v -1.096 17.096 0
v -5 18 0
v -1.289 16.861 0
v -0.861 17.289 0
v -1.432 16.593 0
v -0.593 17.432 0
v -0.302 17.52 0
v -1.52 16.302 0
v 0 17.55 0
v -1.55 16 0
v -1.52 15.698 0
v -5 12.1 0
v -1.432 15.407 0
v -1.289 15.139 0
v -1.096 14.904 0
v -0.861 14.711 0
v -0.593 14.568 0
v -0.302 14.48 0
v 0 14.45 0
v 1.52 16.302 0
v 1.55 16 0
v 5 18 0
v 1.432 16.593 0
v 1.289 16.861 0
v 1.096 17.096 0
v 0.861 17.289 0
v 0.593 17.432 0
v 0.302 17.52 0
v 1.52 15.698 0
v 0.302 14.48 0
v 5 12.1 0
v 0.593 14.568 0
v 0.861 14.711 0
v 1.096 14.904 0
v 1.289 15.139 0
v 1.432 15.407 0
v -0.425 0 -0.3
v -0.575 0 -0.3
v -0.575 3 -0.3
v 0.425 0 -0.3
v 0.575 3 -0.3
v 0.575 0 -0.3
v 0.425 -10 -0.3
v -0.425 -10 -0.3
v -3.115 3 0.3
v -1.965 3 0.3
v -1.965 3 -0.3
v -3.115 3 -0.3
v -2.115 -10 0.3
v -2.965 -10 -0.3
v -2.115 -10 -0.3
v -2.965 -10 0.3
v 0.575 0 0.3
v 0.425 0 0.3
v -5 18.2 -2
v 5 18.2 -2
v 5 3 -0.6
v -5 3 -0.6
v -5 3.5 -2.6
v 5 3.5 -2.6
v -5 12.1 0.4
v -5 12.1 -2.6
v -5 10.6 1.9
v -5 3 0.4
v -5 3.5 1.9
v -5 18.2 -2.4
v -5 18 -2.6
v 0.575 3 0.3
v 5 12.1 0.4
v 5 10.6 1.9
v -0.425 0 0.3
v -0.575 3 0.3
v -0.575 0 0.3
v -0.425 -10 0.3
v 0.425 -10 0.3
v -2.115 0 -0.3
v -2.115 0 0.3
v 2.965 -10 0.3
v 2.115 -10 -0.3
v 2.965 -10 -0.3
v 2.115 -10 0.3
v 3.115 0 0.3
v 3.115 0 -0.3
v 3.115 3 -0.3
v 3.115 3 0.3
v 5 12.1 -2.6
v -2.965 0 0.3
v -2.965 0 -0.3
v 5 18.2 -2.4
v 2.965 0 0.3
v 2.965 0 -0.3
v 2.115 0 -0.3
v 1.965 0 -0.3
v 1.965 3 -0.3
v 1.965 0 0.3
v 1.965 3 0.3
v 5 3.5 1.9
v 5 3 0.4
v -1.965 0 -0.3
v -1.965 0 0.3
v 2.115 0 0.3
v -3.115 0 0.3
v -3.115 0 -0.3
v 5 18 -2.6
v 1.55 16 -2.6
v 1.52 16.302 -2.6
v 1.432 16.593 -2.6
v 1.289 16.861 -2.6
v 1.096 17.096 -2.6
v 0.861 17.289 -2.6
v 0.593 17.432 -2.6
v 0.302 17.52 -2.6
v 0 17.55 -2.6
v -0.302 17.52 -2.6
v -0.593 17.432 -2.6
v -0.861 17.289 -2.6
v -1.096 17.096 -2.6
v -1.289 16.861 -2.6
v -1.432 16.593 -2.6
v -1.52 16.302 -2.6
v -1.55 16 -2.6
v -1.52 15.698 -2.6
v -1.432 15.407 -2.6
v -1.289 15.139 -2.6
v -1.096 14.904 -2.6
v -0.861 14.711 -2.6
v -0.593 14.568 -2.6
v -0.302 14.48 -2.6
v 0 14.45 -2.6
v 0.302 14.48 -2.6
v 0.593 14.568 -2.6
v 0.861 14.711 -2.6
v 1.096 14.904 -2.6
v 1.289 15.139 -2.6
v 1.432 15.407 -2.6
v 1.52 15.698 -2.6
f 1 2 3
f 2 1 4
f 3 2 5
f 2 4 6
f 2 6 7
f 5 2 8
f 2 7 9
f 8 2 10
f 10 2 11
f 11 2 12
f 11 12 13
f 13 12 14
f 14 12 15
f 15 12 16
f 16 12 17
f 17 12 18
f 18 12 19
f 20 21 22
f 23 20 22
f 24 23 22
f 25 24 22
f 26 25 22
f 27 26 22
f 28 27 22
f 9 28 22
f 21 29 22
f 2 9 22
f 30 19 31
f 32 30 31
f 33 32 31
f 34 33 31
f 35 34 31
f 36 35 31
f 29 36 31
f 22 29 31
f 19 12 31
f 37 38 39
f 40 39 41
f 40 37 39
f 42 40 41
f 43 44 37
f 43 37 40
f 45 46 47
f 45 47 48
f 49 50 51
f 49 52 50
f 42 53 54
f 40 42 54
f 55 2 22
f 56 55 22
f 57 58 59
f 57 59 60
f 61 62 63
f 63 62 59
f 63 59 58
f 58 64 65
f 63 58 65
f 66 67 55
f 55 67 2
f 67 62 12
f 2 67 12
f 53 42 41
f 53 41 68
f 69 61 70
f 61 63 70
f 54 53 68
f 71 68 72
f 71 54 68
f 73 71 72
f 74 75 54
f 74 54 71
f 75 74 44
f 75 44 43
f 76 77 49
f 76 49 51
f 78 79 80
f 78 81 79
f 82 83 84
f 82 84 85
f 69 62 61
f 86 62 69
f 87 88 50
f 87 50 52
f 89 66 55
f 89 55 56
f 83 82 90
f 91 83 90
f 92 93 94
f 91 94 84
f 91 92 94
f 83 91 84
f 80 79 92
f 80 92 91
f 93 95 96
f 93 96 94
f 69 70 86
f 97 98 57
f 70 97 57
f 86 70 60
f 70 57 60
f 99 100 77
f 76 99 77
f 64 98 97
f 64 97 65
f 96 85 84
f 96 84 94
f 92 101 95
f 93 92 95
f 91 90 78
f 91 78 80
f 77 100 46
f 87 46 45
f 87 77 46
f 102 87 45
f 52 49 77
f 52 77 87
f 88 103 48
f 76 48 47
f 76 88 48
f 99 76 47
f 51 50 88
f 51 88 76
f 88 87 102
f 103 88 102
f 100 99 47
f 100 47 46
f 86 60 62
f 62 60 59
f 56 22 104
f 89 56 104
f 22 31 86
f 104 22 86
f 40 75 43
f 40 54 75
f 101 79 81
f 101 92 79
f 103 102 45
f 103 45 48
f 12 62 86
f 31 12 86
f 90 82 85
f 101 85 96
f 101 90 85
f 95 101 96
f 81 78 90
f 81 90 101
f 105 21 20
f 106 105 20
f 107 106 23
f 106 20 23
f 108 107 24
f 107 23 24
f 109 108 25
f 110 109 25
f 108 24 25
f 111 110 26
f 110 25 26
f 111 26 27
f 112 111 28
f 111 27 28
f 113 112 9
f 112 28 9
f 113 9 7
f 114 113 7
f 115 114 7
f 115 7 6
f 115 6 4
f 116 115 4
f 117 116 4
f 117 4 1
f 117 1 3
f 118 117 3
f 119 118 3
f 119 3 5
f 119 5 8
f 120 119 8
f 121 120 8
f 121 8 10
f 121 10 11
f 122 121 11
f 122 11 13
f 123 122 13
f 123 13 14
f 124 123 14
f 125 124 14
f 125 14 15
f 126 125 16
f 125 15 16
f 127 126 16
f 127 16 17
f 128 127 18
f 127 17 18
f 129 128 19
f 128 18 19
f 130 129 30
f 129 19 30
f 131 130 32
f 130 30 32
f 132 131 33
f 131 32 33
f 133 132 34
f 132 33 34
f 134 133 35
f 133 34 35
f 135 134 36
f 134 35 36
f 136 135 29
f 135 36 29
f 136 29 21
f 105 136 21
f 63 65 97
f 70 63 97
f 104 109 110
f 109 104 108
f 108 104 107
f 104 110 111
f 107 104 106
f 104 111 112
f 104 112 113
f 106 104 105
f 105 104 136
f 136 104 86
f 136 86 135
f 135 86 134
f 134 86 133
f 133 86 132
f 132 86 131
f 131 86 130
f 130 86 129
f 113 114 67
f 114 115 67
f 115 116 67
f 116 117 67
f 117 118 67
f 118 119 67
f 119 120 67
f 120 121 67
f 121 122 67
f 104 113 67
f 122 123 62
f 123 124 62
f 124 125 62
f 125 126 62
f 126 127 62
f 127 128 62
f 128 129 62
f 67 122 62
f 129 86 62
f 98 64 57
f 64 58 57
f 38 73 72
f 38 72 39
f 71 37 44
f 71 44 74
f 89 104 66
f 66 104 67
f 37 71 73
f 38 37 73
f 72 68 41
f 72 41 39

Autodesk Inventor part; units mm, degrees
ref_plane "YZ Plane" through (0, 0, 0) normal (1, 0, 0) x (0, 1, 0)
ref_plane "XZ Plane" through (0, 0, 0) normal (0, 1, 0) x (-1, 0, 0)
ref_plane "XY Plane" through (0, 0, 0) normal (0, 0, 1) x (1, 0, 0)
sketch "Sketch1" plane through (0, 0, 0) normal (0, 1, 0) x (-1, 0, 0)
  line L0 (3.115, -0.3) -> (1.965, -0.3)
  line L1 (1.965, -0.3) -> (1.965, 0.3)
  line L2 (1.965, 0.3) -> (3.115, 0.3)
  line L3 (3.115, 0.3) -> (3.115, -0.3)
  line L4 (0.575, -0.3) -> (-0.575, -0.3)
  line L5 (-0.575, -0.3) -> (-0.575, 0.3)
  line L6 (-0.575, 0.3) -> (0.575, 0.3)
  line L7 (0.575, 0.3) -> (0.575, -0.3)
  line L8 (-1.965, -0.3) -> (-3.115, -0.3)
  line L9 (-3.115, -0.3) -> (-3.115, 0.3)
  line L10 (-3.115, 0.3) -> (-1.965, 0.3)
  line L11 (-1.965, 0.3) -> (-1.965, -0.3)
  point P0 (0, 0)
  point P1 (3.115, 0)
  point P2 (2.54, 0.3)
  point P3 (0, 0.3)
  point P4 (0.575, 0)
  point P5 (-2.54, 0.3)
  point P6 (-1.965, 0)
  point P7 (0, 0.3)
  dimension "d0" = 1.15
  dimension "d1" = 0.6
  dimension "d4" = 2.54
extrude "Extrusion1" add sketch "Sketch1" along normal blind 3
sketch "Sketch2" plane through (0, 0, 0) normal (0, -1, 0) x (1, 0, 0)
  line L0 (-0.575, 0.3) -> (0.575, 0.3) projected
  line L1 (0.575, -0.3) -> (-0.575, -0.3) projected
  line L2 (-0.425, 0.3) -> (0.425, 0.3)
  line L3 (0.425, 0.3) -> (0.425, -0.3)
  line L4 (0.425, -0.3) -> (-0.425, -0.3)
  line L5 (-0.425, -0.3) -> (-0.425, 0.3)
  line L6 (-3.115, 0.3) -> (-1.965, 0.3) projected
  line L7 (-2.965, 0.3) -> (-2.115, 0.3)
  line L8 (-2.115, 0.3) -> (-2.115, -0.3)
  line L9 (-2.115, -0.3) -> (-2.965, -0.3)
  line L10 (-2.965, -0.3) -> (-2.965, 0.3)
  line L11 (1.965, 0.3) -> (3.115, 0.3) projected
  line L12 (3.115, -0.3) -> (1.965, -0.3) projected
  line L13 (2.115, 0.3) -> (2.965, 0.3)
  line L14 (2.965, 0.3) -> (2.965, -0.3)
  line L15 (2.965, -0.3) -> (2.115, -0.3)
  line L16 (2.115, -0.3) -> (2.115, 0.3)
  line L17 (-1.965, -0.3) -> (-3.115, -0.3) projected
  point P0 (0, 0)
  point P1 (-2.54, 0.3)
  point P2 (-2.54, -0.3)
  point P3 (0, -0.3)
  point P4 (2.54, -0.3)
  dimension "d11" = 0.85
  dimension "d12" = 0.85
  dimension "d13" = 0.85
  dimension "d14" = 2.54
extrude "Extrusion2" add sketch "Sketch2" along normal blind 10
sketch "Sketch3" plane through (0, 3, 0) normal (0, 1, 0) x (1, 0, 0)
  line L0 (5, 2.6) -> (-5, 2.6)
  line L1 (-5, 2.6) -> (-5, -1.9)
  line L2 (-5, -1.9) -> (5, -1.9)
  line L3 (5, -1.9) -> (5, 2.6)
  point P0 (0, 0)
  point P1 (0, -1.9)
  dimension "d17" = 4.5
  dimension "d18" = 2.6
  dimension "d19" = 10
extrude "Extrusion3" add sketch "Sketch3" along normal blind 9.1 separate body
sketch "Sketch4" plane through (0, 12.1, 0) normal (0, 1, 0) x (1, 0, 0)
  line L0 (5, 2.6) -> (-5, 2.6) projected
  line L1 (-5, 2.6) -> (-5, -1.9) projected
  line L2 (5, 2.6) -> (-5, 2.6)
  line L3 (-5, 2.6) -> (-5, 0)
  line L4 (-5, 0) -> (5, 0)
  line L5 (5, 0) -> (5, 2.6)
  point P0 (0, 0)
  dimension "d22" = 2.6
extrude "Extrusion4" add sketch "Sketch4" along normal blind 6.1 bodies 1
sketch "Sketch5" plane through (-5, 12.1, 0) normal (0, 0, 1) x (1, 0, 0)
  circle A0 centre (5, 3.9) radius 1.55
  line L0 (0, -9.1) -> (10, -9.1) projected
  point P0 (5, -12.1)
  point P1 (5.425, -12.1)
  dimension "d25" = 16
  dimension "d26" = 3.1
extrude "Extrusion5" cut sketch "Sketch5" against normal through all bodies 1
chamfer "Chamfer1" distance 0.5 distance2 2 1 edges at (0, 3, -2.6) measured on face at (1.6667, 6.0333, -2.6)
chamfer "Chamfer2" distance 0.5 distance2 1.5 1 edges at (0, 3, 1.9) measured on face at (-1.6667, 6.0333, 1.9)
chamfer "Chamfer3" distance 1.5 distance2 1.5 1 edges at (0, 12.1, 1.9) measured on face at (-1.6667, 12.1, -1.1)
chamfer "Chamfer4" distance 2 distance2 0.2 1 edges at (0, 18.2, 0) measured on face at (-1.6667, 18.2, -0.8667)
chamfer "Chamfer5" distance 0.2 distance2 0.2 1 edges at (0, 18.2, -2.6) measured on face at (-1.6667, 18.2, -2.2)
equation "\"d0\" = fF1"
equation "\"d1\" = fE"
equation "\"d9\" = fG"
equation "\"d11\" = fF2"
equation "\"d12\" = fF2"
equation "\"d13\" = fF2"
equation "\"d15\" = fL4"
equation "\"d17\" = fA1"
equation "\"d18\" = fD1"
equation "\"d20\" = fL7"
equation "\"d22\" = fB1"
equation "\"d23\" = fL6 - fL7"
equation "\"d25\" = fL2"
equation "\"d26\" = fDia"
equation "\"d27\" = fL6 - fL7"
equation "\"fE\" = 0.6"
equation "\"fF1\" = 1.15"
equation "\"fG\" = 3"
equation "\"fF2\" = 0.85"
equation "\"fL4\" = 10"
equation "\"fA1\" = 4.5"
equation "\"fD1\" = 2.6"
equation "\"fH1\" = 1"
equation "\"fL7\" = 9.1"
equation "\"fB1\" = 2.6"
equation "\"fL6\" = 15.2"
equation "\"fL2\" = 16"
equation "\"fDia\" = 3.1"
properties part number "TO220" material "Rubber"
